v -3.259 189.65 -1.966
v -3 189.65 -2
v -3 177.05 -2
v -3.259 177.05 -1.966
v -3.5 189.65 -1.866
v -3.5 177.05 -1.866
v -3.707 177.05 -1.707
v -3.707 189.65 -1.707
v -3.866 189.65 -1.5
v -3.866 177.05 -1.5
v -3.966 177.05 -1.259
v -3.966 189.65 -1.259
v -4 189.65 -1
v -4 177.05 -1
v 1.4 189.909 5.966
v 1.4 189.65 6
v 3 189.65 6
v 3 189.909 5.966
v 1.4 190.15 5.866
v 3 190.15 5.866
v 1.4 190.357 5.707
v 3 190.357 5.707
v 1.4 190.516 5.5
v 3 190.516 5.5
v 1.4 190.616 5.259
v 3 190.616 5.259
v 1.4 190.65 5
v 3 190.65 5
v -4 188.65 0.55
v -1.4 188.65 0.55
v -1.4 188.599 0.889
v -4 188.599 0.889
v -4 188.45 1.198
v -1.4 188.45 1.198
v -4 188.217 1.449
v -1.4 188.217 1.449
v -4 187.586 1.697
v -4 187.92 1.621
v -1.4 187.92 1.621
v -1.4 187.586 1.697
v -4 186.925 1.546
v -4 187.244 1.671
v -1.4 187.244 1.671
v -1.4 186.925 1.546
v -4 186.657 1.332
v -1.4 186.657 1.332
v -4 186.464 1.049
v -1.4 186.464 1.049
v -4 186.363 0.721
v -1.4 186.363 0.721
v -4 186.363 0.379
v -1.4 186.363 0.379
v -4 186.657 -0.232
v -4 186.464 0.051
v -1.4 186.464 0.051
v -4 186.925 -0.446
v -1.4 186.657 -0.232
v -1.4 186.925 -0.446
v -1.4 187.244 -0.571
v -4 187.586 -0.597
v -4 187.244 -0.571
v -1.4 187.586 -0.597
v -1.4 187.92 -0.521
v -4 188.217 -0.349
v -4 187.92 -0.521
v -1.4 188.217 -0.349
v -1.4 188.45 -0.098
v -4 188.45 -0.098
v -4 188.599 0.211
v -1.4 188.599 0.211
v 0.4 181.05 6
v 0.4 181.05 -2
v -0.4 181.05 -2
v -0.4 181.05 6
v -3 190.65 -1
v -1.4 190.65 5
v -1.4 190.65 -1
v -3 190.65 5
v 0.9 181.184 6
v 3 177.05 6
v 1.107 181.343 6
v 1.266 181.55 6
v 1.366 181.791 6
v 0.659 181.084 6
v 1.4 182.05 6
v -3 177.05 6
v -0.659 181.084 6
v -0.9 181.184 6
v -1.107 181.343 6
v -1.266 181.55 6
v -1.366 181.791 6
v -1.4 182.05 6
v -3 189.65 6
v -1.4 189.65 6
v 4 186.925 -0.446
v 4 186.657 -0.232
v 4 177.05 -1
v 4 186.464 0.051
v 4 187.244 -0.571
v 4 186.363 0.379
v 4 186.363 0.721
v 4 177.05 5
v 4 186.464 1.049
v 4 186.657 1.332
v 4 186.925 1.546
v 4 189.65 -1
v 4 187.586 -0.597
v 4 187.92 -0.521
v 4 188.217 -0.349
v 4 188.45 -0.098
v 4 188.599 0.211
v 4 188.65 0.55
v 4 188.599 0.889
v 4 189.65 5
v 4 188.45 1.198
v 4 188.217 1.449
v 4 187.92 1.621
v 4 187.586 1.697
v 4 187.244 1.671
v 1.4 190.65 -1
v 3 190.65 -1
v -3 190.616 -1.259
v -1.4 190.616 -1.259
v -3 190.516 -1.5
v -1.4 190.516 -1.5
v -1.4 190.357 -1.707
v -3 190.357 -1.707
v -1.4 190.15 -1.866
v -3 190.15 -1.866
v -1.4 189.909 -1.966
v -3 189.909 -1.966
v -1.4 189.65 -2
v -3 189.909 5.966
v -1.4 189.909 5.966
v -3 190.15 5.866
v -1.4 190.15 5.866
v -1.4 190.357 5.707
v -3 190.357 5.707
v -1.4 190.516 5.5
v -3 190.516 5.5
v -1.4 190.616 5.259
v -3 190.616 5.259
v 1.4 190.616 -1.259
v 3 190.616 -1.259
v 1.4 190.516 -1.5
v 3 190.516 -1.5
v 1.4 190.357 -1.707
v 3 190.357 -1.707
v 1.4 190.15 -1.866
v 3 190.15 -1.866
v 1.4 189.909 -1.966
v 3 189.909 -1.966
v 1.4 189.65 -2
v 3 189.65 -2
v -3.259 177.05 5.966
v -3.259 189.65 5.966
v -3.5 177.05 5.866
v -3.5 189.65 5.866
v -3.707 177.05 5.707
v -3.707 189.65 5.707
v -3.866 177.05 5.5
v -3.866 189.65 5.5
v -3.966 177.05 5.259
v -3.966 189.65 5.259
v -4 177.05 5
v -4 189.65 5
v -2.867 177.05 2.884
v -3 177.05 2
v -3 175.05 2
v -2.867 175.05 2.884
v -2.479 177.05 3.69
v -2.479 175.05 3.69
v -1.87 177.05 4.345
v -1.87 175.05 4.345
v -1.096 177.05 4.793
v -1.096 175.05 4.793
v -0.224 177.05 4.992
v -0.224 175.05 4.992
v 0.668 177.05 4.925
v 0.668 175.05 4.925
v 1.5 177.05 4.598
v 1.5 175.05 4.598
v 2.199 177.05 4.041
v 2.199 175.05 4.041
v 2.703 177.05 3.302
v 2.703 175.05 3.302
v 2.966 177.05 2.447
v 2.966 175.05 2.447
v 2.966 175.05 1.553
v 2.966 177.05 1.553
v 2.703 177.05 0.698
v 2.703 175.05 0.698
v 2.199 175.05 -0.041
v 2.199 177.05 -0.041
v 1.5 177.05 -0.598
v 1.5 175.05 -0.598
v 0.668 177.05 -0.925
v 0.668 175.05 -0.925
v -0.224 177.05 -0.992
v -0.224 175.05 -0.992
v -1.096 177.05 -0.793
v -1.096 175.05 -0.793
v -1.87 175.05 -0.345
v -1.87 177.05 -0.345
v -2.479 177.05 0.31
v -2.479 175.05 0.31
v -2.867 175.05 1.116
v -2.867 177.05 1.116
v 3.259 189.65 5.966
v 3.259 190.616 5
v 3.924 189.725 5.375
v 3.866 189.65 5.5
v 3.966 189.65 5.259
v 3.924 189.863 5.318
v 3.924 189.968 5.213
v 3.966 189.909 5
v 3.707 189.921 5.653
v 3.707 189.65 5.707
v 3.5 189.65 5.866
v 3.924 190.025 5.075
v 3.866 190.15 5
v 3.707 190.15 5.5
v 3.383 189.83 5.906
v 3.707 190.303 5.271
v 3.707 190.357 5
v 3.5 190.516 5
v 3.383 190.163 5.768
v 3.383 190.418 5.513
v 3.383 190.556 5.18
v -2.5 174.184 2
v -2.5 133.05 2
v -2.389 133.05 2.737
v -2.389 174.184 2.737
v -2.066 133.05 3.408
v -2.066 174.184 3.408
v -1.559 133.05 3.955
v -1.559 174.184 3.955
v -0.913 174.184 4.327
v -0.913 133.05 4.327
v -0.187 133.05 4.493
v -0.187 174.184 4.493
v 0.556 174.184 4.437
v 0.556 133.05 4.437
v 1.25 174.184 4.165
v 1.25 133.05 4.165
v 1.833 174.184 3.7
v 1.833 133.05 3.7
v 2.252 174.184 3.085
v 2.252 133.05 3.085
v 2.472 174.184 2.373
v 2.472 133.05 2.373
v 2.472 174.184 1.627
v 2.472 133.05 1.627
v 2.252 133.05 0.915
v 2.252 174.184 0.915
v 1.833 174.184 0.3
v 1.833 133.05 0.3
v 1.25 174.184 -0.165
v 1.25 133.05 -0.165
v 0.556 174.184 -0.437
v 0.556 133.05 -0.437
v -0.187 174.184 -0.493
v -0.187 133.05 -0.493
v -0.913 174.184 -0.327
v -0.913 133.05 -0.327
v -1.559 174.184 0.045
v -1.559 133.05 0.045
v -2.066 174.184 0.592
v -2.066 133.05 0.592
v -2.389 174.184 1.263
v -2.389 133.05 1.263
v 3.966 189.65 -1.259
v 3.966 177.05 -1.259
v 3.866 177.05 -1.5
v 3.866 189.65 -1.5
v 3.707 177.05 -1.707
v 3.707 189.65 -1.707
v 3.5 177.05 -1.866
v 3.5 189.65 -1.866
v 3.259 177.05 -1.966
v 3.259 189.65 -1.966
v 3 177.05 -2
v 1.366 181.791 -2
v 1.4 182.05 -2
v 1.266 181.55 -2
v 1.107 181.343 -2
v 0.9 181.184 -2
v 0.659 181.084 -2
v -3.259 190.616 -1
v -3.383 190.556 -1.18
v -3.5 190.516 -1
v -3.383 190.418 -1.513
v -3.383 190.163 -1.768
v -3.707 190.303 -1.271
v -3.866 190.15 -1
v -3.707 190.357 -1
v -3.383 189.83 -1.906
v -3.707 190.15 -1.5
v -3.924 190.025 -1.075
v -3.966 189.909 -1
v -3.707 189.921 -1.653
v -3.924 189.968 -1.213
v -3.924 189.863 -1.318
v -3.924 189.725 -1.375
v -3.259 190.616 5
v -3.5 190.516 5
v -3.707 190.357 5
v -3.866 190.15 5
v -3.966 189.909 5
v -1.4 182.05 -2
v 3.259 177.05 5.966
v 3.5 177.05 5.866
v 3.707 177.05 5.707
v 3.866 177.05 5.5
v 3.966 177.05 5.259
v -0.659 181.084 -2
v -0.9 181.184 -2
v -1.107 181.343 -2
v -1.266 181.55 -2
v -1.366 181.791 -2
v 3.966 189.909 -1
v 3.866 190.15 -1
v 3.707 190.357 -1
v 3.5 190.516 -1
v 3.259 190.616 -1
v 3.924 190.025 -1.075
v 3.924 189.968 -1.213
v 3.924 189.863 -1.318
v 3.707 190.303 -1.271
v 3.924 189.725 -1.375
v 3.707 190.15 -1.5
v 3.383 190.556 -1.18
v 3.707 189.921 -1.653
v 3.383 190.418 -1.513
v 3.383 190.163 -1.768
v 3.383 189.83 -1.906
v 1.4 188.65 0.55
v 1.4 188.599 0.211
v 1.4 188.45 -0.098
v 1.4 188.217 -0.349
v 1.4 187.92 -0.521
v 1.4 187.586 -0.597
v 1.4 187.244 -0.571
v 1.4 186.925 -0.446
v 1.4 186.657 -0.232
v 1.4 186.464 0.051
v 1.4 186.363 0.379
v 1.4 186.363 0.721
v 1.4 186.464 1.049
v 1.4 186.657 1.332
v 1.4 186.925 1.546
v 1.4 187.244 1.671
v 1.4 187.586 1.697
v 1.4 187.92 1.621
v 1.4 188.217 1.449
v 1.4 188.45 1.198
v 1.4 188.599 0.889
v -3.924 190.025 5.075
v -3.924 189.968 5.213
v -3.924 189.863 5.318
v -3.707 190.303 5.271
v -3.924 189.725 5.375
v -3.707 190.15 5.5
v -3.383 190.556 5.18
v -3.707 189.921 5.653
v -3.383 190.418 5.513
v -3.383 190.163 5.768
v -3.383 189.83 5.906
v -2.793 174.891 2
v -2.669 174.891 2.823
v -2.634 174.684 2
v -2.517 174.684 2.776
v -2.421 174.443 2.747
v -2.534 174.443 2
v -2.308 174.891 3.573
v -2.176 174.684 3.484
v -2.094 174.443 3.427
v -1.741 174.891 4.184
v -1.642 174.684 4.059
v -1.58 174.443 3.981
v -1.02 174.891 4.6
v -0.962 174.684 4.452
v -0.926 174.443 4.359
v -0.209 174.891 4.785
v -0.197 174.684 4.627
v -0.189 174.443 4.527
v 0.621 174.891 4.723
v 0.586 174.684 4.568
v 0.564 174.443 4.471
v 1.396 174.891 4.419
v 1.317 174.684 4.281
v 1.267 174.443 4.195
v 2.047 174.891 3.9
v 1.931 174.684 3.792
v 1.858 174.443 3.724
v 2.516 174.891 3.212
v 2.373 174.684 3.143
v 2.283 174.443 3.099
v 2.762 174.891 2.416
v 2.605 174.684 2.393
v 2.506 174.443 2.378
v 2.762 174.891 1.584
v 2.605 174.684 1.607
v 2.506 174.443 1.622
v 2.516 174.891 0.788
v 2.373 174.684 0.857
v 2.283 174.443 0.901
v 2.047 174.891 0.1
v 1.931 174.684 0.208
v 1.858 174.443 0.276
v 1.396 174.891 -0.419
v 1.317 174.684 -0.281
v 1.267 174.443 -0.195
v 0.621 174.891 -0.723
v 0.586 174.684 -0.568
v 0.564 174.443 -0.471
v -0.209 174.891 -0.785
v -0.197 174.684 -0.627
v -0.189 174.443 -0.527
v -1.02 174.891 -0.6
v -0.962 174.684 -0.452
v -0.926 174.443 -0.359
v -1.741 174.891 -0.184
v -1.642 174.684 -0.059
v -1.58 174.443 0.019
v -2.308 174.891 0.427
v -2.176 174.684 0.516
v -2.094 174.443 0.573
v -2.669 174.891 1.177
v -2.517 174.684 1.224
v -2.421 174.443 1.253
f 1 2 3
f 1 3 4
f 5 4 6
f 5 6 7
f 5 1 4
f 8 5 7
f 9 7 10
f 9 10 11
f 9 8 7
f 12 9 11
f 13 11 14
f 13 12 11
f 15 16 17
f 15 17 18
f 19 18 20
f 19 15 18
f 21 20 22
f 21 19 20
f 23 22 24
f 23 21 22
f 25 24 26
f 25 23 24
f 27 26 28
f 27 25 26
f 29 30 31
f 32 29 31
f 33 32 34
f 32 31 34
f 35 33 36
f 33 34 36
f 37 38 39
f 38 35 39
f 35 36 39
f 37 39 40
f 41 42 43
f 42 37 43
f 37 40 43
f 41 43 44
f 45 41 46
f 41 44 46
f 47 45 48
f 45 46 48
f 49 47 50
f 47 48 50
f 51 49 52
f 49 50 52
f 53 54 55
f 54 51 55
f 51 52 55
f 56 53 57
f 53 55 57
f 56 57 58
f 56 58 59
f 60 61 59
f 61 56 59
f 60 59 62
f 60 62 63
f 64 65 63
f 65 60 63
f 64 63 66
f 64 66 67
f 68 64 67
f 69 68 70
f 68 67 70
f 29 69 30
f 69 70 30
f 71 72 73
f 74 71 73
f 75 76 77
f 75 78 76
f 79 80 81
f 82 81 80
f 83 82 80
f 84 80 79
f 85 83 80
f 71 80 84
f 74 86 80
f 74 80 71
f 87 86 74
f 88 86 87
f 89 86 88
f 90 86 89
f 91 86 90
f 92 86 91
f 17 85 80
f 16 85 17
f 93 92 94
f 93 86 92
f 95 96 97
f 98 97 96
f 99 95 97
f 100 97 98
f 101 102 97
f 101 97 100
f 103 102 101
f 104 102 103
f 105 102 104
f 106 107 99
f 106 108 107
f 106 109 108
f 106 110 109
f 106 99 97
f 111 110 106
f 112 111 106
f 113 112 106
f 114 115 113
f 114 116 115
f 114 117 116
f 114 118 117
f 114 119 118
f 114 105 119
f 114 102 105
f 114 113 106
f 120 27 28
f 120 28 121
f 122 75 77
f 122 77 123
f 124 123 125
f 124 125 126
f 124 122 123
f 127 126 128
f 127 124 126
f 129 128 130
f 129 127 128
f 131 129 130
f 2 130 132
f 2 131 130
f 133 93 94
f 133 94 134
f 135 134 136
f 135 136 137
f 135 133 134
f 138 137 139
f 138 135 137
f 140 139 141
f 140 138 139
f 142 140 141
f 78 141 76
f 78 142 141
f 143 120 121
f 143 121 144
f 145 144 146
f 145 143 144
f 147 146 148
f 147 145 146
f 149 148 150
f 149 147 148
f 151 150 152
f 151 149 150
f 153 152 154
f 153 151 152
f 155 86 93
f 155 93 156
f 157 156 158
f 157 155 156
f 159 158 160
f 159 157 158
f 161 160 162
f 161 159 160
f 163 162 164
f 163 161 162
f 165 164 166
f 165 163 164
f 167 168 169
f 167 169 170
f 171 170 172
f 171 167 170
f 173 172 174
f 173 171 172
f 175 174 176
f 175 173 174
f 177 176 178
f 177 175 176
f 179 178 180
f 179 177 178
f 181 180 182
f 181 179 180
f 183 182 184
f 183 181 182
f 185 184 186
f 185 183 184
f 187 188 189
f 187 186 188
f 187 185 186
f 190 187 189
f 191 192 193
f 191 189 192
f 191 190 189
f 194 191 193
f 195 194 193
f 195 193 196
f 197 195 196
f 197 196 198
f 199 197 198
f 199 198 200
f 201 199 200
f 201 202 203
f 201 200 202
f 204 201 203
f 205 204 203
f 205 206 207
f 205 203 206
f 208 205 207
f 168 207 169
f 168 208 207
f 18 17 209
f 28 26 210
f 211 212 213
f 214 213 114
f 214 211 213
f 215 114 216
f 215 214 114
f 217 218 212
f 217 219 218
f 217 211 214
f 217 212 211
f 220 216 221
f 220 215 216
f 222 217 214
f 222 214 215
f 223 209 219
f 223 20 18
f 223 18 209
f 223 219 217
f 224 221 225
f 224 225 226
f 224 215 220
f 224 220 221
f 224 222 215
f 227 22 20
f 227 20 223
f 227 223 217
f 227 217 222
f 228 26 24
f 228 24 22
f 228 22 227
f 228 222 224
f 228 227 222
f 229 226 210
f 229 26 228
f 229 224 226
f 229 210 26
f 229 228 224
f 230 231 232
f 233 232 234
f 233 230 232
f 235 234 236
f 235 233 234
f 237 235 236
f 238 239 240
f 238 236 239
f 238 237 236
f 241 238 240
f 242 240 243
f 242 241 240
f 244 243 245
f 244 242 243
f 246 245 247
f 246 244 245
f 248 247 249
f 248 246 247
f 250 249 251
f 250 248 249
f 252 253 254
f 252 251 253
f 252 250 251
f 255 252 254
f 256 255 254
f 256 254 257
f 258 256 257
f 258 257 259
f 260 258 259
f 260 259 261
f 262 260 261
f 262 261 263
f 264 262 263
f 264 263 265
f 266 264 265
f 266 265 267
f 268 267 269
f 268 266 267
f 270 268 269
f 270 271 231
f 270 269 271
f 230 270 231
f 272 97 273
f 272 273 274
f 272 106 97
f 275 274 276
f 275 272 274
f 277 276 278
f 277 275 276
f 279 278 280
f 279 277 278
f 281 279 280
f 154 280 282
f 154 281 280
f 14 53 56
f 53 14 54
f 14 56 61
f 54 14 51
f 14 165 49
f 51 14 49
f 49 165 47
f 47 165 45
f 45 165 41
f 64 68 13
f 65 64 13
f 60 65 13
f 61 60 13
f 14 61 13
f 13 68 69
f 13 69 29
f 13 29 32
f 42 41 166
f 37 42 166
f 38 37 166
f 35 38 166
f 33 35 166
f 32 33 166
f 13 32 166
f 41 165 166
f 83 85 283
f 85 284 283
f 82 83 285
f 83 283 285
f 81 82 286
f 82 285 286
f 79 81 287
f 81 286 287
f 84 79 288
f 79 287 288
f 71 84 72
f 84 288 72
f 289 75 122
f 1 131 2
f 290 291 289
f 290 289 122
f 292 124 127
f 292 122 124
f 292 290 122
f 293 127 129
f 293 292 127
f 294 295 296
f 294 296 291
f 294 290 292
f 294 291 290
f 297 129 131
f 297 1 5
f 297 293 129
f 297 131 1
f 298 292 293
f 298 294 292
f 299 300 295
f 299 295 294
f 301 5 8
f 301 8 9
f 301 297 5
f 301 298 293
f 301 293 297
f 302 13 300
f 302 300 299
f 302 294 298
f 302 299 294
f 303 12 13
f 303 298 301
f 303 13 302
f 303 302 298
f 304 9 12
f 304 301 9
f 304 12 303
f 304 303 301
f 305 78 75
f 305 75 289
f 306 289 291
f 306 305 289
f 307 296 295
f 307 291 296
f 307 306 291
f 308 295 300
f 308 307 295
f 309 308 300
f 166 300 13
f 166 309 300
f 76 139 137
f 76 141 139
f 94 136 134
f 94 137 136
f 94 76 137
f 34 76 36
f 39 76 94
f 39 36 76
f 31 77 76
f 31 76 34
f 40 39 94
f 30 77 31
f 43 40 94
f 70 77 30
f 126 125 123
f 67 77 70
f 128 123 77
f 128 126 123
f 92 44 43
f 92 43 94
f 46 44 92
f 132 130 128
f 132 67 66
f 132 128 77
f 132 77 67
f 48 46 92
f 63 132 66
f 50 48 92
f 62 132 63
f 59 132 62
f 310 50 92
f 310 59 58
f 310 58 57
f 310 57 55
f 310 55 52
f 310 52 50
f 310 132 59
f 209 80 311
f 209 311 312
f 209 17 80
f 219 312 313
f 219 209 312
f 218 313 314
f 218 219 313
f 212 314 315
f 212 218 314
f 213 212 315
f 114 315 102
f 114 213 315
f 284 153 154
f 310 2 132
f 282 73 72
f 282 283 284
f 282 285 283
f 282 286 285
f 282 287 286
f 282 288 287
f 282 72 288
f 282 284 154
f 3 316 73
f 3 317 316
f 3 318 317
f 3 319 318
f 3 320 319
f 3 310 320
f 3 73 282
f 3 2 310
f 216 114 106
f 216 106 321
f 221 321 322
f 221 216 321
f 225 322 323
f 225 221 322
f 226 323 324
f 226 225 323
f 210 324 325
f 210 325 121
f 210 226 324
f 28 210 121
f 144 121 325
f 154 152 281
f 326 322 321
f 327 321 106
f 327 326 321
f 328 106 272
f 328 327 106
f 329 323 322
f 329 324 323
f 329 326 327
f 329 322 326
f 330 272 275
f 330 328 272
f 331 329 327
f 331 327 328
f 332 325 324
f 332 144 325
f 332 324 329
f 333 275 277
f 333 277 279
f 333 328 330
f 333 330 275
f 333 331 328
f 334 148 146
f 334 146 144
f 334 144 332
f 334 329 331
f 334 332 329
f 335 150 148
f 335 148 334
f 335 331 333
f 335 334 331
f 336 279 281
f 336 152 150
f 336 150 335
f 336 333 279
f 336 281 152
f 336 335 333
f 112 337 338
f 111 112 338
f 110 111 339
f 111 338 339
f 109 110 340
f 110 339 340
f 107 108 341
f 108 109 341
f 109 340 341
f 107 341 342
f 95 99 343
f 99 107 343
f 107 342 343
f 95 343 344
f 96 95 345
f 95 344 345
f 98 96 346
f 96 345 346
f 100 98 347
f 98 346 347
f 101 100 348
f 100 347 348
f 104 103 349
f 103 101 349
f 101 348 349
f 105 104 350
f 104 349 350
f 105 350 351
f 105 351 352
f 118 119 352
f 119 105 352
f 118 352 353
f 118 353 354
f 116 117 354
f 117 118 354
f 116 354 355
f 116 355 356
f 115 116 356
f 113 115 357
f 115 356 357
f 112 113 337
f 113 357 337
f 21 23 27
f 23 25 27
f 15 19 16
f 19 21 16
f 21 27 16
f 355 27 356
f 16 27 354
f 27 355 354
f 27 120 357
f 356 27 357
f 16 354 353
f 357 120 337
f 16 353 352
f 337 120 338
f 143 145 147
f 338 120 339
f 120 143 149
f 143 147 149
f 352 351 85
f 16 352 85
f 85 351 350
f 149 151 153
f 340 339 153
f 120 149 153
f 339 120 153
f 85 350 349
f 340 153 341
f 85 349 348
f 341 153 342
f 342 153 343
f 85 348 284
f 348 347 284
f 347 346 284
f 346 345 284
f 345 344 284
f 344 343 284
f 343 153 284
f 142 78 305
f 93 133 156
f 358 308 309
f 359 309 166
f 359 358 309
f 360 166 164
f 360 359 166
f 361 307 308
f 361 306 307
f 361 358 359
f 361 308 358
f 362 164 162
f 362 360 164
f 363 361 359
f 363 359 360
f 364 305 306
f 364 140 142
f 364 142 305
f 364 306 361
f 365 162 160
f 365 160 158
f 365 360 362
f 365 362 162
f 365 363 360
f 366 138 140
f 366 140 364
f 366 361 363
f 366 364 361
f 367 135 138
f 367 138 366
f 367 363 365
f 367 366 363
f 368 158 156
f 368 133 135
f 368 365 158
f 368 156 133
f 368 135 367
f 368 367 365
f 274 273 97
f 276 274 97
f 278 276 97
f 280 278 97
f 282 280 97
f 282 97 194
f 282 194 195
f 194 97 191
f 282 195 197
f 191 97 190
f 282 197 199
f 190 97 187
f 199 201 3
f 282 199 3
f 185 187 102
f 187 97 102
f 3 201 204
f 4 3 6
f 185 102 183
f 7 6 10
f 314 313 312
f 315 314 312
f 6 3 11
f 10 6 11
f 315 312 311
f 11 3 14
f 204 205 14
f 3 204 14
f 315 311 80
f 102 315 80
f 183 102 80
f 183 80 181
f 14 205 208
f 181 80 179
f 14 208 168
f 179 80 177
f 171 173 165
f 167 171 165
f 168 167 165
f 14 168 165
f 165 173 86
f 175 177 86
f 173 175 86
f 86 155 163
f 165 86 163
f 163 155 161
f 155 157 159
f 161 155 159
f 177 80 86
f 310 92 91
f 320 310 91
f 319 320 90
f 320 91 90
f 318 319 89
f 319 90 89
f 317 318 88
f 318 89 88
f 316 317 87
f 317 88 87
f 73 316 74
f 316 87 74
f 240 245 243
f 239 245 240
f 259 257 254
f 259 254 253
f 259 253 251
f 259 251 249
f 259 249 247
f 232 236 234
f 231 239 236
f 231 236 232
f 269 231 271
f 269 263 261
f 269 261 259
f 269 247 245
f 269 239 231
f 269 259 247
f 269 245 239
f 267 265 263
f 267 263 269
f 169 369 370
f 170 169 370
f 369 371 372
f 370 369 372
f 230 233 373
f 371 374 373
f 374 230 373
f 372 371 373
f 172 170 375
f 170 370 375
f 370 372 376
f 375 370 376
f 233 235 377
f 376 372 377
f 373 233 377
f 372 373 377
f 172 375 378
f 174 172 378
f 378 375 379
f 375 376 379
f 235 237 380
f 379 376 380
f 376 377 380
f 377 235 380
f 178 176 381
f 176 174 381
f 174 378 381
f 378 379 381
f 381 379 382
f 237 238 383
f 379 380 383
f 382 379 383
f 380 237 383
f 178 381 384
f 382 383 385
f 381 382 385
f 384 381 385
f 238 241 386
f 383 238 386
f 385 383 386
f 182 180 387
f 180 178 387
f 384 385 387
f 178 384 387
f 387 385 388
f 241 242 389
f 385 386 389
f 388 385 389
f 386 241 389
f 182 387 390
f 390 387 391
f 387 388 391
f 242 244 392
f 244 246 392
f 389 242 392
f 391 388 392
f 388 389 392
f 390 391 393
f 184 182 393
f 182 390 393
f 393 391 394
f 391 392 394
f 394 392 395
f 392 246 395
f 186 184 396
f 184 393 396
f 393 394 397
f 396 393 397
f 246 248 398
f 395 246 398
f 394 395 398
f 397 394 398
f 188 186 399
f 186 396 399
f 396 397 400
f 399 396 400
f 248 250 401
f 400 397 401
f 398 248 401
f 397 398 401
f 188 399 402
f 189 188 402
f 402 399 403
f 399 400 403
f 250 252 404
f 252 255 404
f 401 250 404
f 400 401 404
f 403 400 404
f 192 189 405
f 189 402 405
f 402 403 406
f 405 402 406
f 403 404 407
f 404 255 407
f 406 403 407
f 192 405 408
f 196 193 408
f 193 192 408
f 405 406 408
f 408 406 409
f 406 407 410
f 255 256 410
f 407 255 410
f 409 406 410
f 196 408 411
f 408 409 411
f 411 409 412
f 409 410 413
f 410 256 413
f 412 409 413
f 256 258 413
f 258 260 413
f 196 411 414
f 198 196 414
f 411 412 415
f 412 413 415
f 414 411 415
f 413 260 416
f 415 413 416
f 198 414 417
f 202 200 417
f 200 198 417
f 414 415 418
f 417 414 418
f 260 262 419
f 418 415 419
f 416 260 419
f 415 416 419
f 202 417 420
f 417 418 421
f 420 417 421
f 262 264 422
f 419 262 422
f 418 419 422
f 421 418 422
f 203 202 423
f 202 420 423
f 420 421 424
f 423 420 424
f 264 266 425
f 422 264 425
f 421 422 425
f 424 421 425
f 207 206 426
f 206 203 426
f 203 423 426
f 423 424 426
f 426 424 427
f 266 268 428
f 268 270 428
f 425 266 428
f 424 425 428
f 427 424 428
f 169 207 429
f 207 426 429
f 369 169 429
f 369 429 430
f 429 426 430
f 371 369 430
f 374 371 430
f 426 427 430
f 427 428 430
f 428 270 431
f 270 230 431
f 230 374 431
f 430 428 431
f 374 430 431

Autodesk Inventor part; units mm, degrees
ref_plane "YZ Plane" through (0, 0, 0) normal (1, 0, 0) x (0, 1, 0)
ref_plane "XY Plane" through (0, 0, 0) normal (0, 0, 1) x (1, 0, 0)
sketch "Boceto1" plane through (0, 0, 0) normal (1, 0, 0) x (0, 1, 0)
  circle A0 centre (0, 0) radius 5
  line L0 (0, 0) -> (0, 6)
  line L1 (0, 6) -> (-4, 6)
  line L2 (-5, 5) -> (-5, 0)
  line L3 (0, 6) -> (181.05, 6)
  line L4 (181.05, 6) -> (187.5, 6)
  line L5 (187.5, 6) -> (189.65, 6)
  line L6 (190.65, 5) -> (190.65, -1)
  line L7 (189.65, -2) -> (4.5826, -2)
  arc A1 (-4, 6) -> (-5, 5) centre (-4, 5) ccw
  arc A2 (190.65, 5) -> (189.65, 6) centre (189.65, 5) ccw
  arc A3 (189.65, -2) -> (190.65, -1) centre (189.65, -1) ccw
  line L8 (3.5707, -3.5) -> (-3.5707, -3.5)
  point P0 (-5, 6)
  point P1 (190.65, 6)
  point P2 (190.65, -2)
  dimension "d0" = 10
  dimension "d1" = 6
  dimension "d2" = 5
  dimension "d3" = 181.05
  dimension "d4" = 6.45
  dimension "d5" = 3.15
  dimension "d6" = 8
  dimension "d7" = 1
  dimension "d8" = 1
  dimension "d45" = 1.5
extrude "Extrusión1" add sketch "Boceto1" along normal mid plane 8 contours A0 L8 | L2 A1 L1 L0 A0 | L0 L3 L4 L5 A2 L6 A3 L7 A0 picked at (0, -0.6667)
fillet "Empalme1" radius 1 18 edges at (-4, 190.3571, 5.7071) (-4, 190.65, 2) (-4, 190.3571, -1.7071) (-4, 97.1163, -2) (-4, -4.7071, 5.7071) (-4, -5, 2.5) (-4, -4.6289, -1.8903) (-4, 4.1451, -2.7962) (-4, 92.825, 6) (4, -4.7071, 5.7071) (4, -5, 2.5) (4, -4.6289, -1.8903) (4, 4.1451, -2.7962) (4, 190.3571, 5.7071) (4, 190.65, 2) (4, 190.3571, -1.7071) (4, 97.1163, -2) (4, 92.825, 6)
sketch "Boceto2" plane through (-4, 0, 0) normal (-1, 0, 0) x (0, 0, 1)
  circle A0 centre (0, 0) radius 5.5
  line L0 (4.7631, 2.75) -> (-2, 14.4641)
  line L1 (-2, 189.65) -> (-2, 4.5826) projected
  line L2 (5.5, 0) -> (5.5, -5.5)
  line L3 (0, -5) -> (5, -5) projected
  line L4 (0, -5.5) -> (5.5, -5.5)
  line L5 (-2, 14.4641) -> (-2, 5.1235)
  dimension "d12" = 11
  dimension "d13" = 30
extrude "Extrusión2" cut sketch "Boceto2" against normal blind 2.5
sketch "Boceto3" plane through (0, 0, 0) normal (0, 0, 1) x (1, 0, 0)
  line L0 (-3, 190.65) -> (3, 190.65) projected
  line L1 (0, 190.65) -> (0, 181.05)
  line L2 (1.4, 190.65) -> (1.4, 181.05)
  line L3 (-1.4, 190.65) -> (-1.4, 181.05)
  line L4 (1.4, 190.65) -> (-1.4, 190.65)
  line L5 (0, 181.05) -> (1.4, 181.05)
  line L6 (0, 181.05) -> (-1.4, 181.05)
  point P0 (0, 0)
  dimension "d16" = 9.6
  dimension "d17" = 1.4
  dimension "d18" = 1.4
extrude "Extrusión3" cut sketch "Boceto3" along normal mid plane 16
fillet "Empalme4" radius 1 2 edges at (-1.4, 181.05, 2) (1.4, 181.05, 2)
sketch "Boceto11" plane through (0, 0, 0) normal (1, 0, 0) x (0, 1, 0)
  line L0 (0, 0) -> (0, 6)
  line L1 (0, 6) -> (181.05, 6)
  line L2 (189.65, 6) -> (-4, 6) projected
  line L3 (181.05, 6) -> (187.5, 6)
  line L4 (187.5, 6) -> (187.5, 0.55)
  circle A0 centre (187.5, 0.55) radius 1.15
  dimension "d66" = 6
  dimension "d67" = 181.05
  dimension "d68" = 6.45
  dimension "d69" = 5.45
  dimension "d70" = 2.3
extrude "Extrusión9" cut sketch "Boceto11" along normal through all both and the other way through all
sketch "Boceto6" plane through (0, 0, 0) normal (0, 0, 1) x (1, 0, 0)
  line L0 (0, 0) -> (-1.5, 0)
  line L1 (-1.5, 0) -> (-1.5, -3)
  line L2 (-1.5, -5) -> (-1.5, 4.5826) projected
  line L3 (-1.5, -3) -> (-4.5, -3)
  line L4 (-1.5, 0) -> (-9.5, 0)
  line L5 (-4.5, -3) -> (-4.5, -3.5)
  line L6 (-9.5, 0) -> (-9.5, -2.3732)
  line L7 (-9.5, -2.3732) -> (-4.5, -3.5)
  dimension "d27" = 1.5
  dimension "d28" = 3
  dimension "d29" = 3
  dimension "d30" = 8
  dimension "d31" = 0.5
  dimension "d32" = 2.3732
revolve "Revolución1" add sketch "Boceto6" angle 360 about axis through (-1.5, 0, 0) along (-1, 0, 0)
sketch "Boceto7" plane through (0, 0, 0) normal (0, 0, 1) x (1, 0, 0)
  line L0 (0, 0) -> (-1.5, 0)
  line L1 (-1.5, 0) -> (-4.5, 0)
  line L2 (-4.5, 0) -> (-9.5, 0)
  line L3 (-9.5, 0) -> (-9.5, -1)
  line L4 (-9.5, 2.3732) -> (-9.5, -2.3732) projected
  line L5 (-9.5, -1) -> (-2.5, -1)
  line L6 (-2.5, -1) -> (-2.5, 1)
  line L7 (-2.5, 1) -> (-9.5, 1)
  line L8 (-9.5, 1) -> (-9.5, 0)
  point P0 (-9.5, 1)
  dimension "d34" = 1.5
  dimension "d35" = 3
  dimension "d36" = 5
  dimension "d37" = 1
  dimension "d38" = 7
  dimension "d39" = 2
extrude "Extrusión5" cut sketch "Boceto7" along normal mid plane 7
fillet "Empalme2" radius 1 2 edges at (-2.5, -1, 0) (-2.5, 1, 0)
ref_plane "Plano de trabajo2" through (0, 177.05, 0) normal (0, 1, 0) x (-1, 0, 0)
sketch "Boceto8" plane through (0, 177.05, 0) normal (0, 1, 0) x (-1, 0, 0)
  line L0 (0, 0) -> (0, 2)
  line L1 (16, 18) -> (-16, 18)
  line L2 (-16, 18) -> (-16, -14)
  line L3 (-16, -14) -> (16, -14)
  line L4 (16, -14) -> (16, 18)
  line L5 (16, 18) -> (-16, -14) construction
  line L6 (-16, 18) -> (16, -14) construction
  point P0 (0, 0)
  dimension "d49" = 2
  dimension "d50" = 32
  dimension "d51" = 32
  dimension "d78" = 0
extrude "Extrusión6" cut sketch "Boceto8" against normal blind 362.1
sketch "Boceto9" plane through (0, 177.05, 0) normal (0, -1, 0) x (-1, 0, 0)
  line L0 (3, -6) -> (-3, -6) projected
  line L1 (0, 0) -> (0, -2)
  circle A0 centre (0, -2) radius 2.5
  point P0 (0, 0)
  point P1 (-2.6, -6)
  dimension "d55" = 2
  dimension "d56" = 5
  dimension "d79" = 0
  dimension "d80" = 0
extrude "Extrusión7" add sketch "Boceto9" along normal blind 44
sketch "Boceto10" plane through (0, 177.05, 0) normal (0, -1, 0) x (-1, 0, 0)
  circle A0 centre (0, -2) radius 2.5 projected
  circle A1 centre (0, -2) radius 3
  point P0 (0, 0)
  dimension "d59" = 6
extrude "Extrusión8" add sketch "Boceto10" along normal blind 2 contours A0 | A1
fillet "Empalme3" radius 1 1 edges at (2.5, 175.05, 2)
equation "\"d0\" = width_r3"
equation "\"d1\" = 0.5 * width_r3 + offset"
equation "\"d2\" = 0.5 * width_r3"
equation "\"d3\" = lenght_body_link - 0.5 * width_r3"
equation "\"d4\" = shaft_y"
equation "\"d5\" = 0.5 * Djoint_shaft + 2 * offset"
equation "\"d6\" = width_link"
equation "\"d45\" = 1.5 * offset"
equation "\"d9\" = width_link"
equation "\"d12\" = width_r3 + offset"
equation "\"d14\" = 0.5 * width_link - 0.5 * t_thikness"
equation "\"d16\" = 0.5 * Djoint_shaft + 2 * offset + shaft_y"
equation "\"d17\" = 0.25 * offset + 0.5 * wire_D"
equation "\"d18\" = 0.25 * offset + 0.5 * wire_D"
equation "\"d19\" = 2 * width_link"
equation "\"d63\" = offset"
equation "\"d27\" = 0.5 * t_thikness"
equation "\"d28\" = 0.5 * sj_diam_shaft"
equation "\"d29\" = t_thikness"
equation "\"d30\" = t_thikness + sj_head_height"
equation "\"d31\" = 0.5 * sj_head_D - 0.5 * sj_diam_shaft"
equation "\"d32\" = 0.5 * sj_head_d"
equation "\"d34\" = 0.5 * t_thikness"
equation "\"d35\" = t_thikness"
equation "\"d36\" = sj_head_height"
equation "\"d37\" = 0.5 * sj_groove"
equation "\"d38\" = sj_groove_deep"
equation "\"d39\" = sj_groove"
equation "\"d40\" = sj_head_D"
equation "\"d46\" = 0.5 * sj_groove"
equation "\"d56\" = spring_int_d - offset"
equation "\"d59\" = spring_int_d"
equation "\"d60\" = thikness"
equation "\"d62\" = offset"
equation "\"offset\" = 1"
equation "\"wire_D\" = 2.3"
equation "\"width_link\" = 8"
equation "\"Djoint_shaft\" = 2.3"
equation "\"shaft_x\" = 1.45"
equation "\"shaft_y\" = 6.45"
equation "\"lenght_body_link\" = 186.05"
equation "\"m2_theta3f\" = -60deg"
equation "\"width_r3\" = 10"
equation "\"t_thikness\" = 3"
equation "\"sj_diam_shaft\" = 6"
equation "\"sj_groove\" = 2"
equation "\"sj_groove_deep\" = 7"
equation "\"sj_head_D\" = 7"
equation "\"sj_head_d\" = 4.7464"
equation "\"sj_head_height\" = 5"
equation "\"thikness\" = 2"
equation "\"spring_int_d\" = 6"
equation "\"spring_lenght\" = 28"
equation "\"r1\" = 5.55"
equation "\"r2o\" = 59.75"
equation "\"delta_y\" = 6"
equation "\"wire_d\" = 1"
equation "\"width_ang_spring\" = 5"
equation "\"spring_int_diam\" = 8.5"
equation "\"spring_ext_diam\" = 10.5"
equation "\"r3\" = 8.25"
equation "\"r3R\" = 4.75"
equation "\"r3T\" = 6.74537"
equation "\"alpha\" = 54.847297deg"
equation "\"alpha2\" = 270deg"
equation "\"theta3_recogido\" = 305.152703deg"
equation "\"delta_theta_3\" = 45deg"
equation "\"joint_width\" = 12"
equation "\"joint_radius\" = 7.75"
equation "\"shaft_width\" = 15"
equation "\"shaft_joint_diameter\" = 7.75"
equation "\"separation_space\" = 0.5"
equation "\"height_finger\" = 42"
equation "\"cell_screw_head_diameter\" = 4"
equation "\"cell_screw_diameter\" = 2"
equation "\"cell_space\" = 2"
equation "\"cell_width\" = 6"
equation "\"cell_theta_position\" = 60deg"
equation "\"cell_thikness\" = 1"
equation "\"cell_lenght\" = 37"
equation "\"cell_z_space\" = 5"
equation "\"Dt\" = 1.05949"
equation "\"lenght_bar_support\" = 201.65"
equation "\"wire_spring_d\" = 1"
equation "\"trigger_offset\" = 2"
equation "\"m2_theta2o\" = 107deg"
equation "\"m2_r2\" = 28"
equation "\"e\" = 9"
equation "\"So\" = 17"
equation "\"m2_theta3o\" = -30deg"
equation "\"m2_r3\" = 19.75"
equation "\"m2_delta_theta1\" = 15deg"
equation "\"trigger_thumb_lenght\" = 6"
equation "\"width_r12\" = 8"
equation "\"m2_r1\" = 25.2"
equation "\"r3_thikness\" = 3.5"
equation "\"tg_width\" = 4"
equation "\"pivot_screw_d\" = 4"
equation "\"pivot_diameter\" = 7"
equation "\"sf_lenght\" = 9.5"
equation "\"sf_base\" = 3"
equation "\"sf_head_height\" = 3"
equation "\"sf_head_width\" = 4.5"
equation "\"sf_head_offset\" = 0.25"
equation "\"sf_head_grip_width\" = 2"
equation "\"sf_head_angle\" = 45deg"
equation "\"sf_thikness\" = 5"
equation "\"screw_Dhead\" = 8"
equation "\"screw_d\" = 4"
equation "\"screw_lenght\" = 12"
equation "\"screwJ_base_D\" = 9"
equation "\"screwJ_top_D\" = 13"
equation "\"gj_D\" = 6"
equation "\"gj_d\" = 4"
equation "\"gj_out_section\" = 6"
equation "\"agarradera_theta\" = 60deg"
equation "\"agarradera_width\" = 4"
equation "\"sfbox_theta1\" = 60deg"
equation "\"sfbox_theta2\" = 45deg"
equation "\"position\" = 39.13077"
equation "\"fat_width_slider\" = 2"
equation "\"sfbox_tip_width\" = 2.5"
equation "\"flex_separation_theta\" = 60deg"
equation "\"sf_flex_separation\" = 38.66667"
equation "\"ext_width_slider\" = 3.5"
equation "\"sf_box_width\" = 1.5"
equation "\"slim_width_slider\" = 1.5"
equation "\"sfbox_width\" = 1.5"
equation "\"int_width_slider\" = 2"
equation "\"box_fat_slider_lenght\" = 67"
equation "\"box_slim_slider_lenght\" = 116"
equation "\"thikness_box\" = 1.5"
equation "\"box_in_height\" = 35"
equation "\"box_in_width\" = 72"
equation "\"box_in_deep\" = 77"
equation "\"agarradera_position\" = 82.13077"
properties part number "Eslabón conector M1" material "Plástico PPS"
